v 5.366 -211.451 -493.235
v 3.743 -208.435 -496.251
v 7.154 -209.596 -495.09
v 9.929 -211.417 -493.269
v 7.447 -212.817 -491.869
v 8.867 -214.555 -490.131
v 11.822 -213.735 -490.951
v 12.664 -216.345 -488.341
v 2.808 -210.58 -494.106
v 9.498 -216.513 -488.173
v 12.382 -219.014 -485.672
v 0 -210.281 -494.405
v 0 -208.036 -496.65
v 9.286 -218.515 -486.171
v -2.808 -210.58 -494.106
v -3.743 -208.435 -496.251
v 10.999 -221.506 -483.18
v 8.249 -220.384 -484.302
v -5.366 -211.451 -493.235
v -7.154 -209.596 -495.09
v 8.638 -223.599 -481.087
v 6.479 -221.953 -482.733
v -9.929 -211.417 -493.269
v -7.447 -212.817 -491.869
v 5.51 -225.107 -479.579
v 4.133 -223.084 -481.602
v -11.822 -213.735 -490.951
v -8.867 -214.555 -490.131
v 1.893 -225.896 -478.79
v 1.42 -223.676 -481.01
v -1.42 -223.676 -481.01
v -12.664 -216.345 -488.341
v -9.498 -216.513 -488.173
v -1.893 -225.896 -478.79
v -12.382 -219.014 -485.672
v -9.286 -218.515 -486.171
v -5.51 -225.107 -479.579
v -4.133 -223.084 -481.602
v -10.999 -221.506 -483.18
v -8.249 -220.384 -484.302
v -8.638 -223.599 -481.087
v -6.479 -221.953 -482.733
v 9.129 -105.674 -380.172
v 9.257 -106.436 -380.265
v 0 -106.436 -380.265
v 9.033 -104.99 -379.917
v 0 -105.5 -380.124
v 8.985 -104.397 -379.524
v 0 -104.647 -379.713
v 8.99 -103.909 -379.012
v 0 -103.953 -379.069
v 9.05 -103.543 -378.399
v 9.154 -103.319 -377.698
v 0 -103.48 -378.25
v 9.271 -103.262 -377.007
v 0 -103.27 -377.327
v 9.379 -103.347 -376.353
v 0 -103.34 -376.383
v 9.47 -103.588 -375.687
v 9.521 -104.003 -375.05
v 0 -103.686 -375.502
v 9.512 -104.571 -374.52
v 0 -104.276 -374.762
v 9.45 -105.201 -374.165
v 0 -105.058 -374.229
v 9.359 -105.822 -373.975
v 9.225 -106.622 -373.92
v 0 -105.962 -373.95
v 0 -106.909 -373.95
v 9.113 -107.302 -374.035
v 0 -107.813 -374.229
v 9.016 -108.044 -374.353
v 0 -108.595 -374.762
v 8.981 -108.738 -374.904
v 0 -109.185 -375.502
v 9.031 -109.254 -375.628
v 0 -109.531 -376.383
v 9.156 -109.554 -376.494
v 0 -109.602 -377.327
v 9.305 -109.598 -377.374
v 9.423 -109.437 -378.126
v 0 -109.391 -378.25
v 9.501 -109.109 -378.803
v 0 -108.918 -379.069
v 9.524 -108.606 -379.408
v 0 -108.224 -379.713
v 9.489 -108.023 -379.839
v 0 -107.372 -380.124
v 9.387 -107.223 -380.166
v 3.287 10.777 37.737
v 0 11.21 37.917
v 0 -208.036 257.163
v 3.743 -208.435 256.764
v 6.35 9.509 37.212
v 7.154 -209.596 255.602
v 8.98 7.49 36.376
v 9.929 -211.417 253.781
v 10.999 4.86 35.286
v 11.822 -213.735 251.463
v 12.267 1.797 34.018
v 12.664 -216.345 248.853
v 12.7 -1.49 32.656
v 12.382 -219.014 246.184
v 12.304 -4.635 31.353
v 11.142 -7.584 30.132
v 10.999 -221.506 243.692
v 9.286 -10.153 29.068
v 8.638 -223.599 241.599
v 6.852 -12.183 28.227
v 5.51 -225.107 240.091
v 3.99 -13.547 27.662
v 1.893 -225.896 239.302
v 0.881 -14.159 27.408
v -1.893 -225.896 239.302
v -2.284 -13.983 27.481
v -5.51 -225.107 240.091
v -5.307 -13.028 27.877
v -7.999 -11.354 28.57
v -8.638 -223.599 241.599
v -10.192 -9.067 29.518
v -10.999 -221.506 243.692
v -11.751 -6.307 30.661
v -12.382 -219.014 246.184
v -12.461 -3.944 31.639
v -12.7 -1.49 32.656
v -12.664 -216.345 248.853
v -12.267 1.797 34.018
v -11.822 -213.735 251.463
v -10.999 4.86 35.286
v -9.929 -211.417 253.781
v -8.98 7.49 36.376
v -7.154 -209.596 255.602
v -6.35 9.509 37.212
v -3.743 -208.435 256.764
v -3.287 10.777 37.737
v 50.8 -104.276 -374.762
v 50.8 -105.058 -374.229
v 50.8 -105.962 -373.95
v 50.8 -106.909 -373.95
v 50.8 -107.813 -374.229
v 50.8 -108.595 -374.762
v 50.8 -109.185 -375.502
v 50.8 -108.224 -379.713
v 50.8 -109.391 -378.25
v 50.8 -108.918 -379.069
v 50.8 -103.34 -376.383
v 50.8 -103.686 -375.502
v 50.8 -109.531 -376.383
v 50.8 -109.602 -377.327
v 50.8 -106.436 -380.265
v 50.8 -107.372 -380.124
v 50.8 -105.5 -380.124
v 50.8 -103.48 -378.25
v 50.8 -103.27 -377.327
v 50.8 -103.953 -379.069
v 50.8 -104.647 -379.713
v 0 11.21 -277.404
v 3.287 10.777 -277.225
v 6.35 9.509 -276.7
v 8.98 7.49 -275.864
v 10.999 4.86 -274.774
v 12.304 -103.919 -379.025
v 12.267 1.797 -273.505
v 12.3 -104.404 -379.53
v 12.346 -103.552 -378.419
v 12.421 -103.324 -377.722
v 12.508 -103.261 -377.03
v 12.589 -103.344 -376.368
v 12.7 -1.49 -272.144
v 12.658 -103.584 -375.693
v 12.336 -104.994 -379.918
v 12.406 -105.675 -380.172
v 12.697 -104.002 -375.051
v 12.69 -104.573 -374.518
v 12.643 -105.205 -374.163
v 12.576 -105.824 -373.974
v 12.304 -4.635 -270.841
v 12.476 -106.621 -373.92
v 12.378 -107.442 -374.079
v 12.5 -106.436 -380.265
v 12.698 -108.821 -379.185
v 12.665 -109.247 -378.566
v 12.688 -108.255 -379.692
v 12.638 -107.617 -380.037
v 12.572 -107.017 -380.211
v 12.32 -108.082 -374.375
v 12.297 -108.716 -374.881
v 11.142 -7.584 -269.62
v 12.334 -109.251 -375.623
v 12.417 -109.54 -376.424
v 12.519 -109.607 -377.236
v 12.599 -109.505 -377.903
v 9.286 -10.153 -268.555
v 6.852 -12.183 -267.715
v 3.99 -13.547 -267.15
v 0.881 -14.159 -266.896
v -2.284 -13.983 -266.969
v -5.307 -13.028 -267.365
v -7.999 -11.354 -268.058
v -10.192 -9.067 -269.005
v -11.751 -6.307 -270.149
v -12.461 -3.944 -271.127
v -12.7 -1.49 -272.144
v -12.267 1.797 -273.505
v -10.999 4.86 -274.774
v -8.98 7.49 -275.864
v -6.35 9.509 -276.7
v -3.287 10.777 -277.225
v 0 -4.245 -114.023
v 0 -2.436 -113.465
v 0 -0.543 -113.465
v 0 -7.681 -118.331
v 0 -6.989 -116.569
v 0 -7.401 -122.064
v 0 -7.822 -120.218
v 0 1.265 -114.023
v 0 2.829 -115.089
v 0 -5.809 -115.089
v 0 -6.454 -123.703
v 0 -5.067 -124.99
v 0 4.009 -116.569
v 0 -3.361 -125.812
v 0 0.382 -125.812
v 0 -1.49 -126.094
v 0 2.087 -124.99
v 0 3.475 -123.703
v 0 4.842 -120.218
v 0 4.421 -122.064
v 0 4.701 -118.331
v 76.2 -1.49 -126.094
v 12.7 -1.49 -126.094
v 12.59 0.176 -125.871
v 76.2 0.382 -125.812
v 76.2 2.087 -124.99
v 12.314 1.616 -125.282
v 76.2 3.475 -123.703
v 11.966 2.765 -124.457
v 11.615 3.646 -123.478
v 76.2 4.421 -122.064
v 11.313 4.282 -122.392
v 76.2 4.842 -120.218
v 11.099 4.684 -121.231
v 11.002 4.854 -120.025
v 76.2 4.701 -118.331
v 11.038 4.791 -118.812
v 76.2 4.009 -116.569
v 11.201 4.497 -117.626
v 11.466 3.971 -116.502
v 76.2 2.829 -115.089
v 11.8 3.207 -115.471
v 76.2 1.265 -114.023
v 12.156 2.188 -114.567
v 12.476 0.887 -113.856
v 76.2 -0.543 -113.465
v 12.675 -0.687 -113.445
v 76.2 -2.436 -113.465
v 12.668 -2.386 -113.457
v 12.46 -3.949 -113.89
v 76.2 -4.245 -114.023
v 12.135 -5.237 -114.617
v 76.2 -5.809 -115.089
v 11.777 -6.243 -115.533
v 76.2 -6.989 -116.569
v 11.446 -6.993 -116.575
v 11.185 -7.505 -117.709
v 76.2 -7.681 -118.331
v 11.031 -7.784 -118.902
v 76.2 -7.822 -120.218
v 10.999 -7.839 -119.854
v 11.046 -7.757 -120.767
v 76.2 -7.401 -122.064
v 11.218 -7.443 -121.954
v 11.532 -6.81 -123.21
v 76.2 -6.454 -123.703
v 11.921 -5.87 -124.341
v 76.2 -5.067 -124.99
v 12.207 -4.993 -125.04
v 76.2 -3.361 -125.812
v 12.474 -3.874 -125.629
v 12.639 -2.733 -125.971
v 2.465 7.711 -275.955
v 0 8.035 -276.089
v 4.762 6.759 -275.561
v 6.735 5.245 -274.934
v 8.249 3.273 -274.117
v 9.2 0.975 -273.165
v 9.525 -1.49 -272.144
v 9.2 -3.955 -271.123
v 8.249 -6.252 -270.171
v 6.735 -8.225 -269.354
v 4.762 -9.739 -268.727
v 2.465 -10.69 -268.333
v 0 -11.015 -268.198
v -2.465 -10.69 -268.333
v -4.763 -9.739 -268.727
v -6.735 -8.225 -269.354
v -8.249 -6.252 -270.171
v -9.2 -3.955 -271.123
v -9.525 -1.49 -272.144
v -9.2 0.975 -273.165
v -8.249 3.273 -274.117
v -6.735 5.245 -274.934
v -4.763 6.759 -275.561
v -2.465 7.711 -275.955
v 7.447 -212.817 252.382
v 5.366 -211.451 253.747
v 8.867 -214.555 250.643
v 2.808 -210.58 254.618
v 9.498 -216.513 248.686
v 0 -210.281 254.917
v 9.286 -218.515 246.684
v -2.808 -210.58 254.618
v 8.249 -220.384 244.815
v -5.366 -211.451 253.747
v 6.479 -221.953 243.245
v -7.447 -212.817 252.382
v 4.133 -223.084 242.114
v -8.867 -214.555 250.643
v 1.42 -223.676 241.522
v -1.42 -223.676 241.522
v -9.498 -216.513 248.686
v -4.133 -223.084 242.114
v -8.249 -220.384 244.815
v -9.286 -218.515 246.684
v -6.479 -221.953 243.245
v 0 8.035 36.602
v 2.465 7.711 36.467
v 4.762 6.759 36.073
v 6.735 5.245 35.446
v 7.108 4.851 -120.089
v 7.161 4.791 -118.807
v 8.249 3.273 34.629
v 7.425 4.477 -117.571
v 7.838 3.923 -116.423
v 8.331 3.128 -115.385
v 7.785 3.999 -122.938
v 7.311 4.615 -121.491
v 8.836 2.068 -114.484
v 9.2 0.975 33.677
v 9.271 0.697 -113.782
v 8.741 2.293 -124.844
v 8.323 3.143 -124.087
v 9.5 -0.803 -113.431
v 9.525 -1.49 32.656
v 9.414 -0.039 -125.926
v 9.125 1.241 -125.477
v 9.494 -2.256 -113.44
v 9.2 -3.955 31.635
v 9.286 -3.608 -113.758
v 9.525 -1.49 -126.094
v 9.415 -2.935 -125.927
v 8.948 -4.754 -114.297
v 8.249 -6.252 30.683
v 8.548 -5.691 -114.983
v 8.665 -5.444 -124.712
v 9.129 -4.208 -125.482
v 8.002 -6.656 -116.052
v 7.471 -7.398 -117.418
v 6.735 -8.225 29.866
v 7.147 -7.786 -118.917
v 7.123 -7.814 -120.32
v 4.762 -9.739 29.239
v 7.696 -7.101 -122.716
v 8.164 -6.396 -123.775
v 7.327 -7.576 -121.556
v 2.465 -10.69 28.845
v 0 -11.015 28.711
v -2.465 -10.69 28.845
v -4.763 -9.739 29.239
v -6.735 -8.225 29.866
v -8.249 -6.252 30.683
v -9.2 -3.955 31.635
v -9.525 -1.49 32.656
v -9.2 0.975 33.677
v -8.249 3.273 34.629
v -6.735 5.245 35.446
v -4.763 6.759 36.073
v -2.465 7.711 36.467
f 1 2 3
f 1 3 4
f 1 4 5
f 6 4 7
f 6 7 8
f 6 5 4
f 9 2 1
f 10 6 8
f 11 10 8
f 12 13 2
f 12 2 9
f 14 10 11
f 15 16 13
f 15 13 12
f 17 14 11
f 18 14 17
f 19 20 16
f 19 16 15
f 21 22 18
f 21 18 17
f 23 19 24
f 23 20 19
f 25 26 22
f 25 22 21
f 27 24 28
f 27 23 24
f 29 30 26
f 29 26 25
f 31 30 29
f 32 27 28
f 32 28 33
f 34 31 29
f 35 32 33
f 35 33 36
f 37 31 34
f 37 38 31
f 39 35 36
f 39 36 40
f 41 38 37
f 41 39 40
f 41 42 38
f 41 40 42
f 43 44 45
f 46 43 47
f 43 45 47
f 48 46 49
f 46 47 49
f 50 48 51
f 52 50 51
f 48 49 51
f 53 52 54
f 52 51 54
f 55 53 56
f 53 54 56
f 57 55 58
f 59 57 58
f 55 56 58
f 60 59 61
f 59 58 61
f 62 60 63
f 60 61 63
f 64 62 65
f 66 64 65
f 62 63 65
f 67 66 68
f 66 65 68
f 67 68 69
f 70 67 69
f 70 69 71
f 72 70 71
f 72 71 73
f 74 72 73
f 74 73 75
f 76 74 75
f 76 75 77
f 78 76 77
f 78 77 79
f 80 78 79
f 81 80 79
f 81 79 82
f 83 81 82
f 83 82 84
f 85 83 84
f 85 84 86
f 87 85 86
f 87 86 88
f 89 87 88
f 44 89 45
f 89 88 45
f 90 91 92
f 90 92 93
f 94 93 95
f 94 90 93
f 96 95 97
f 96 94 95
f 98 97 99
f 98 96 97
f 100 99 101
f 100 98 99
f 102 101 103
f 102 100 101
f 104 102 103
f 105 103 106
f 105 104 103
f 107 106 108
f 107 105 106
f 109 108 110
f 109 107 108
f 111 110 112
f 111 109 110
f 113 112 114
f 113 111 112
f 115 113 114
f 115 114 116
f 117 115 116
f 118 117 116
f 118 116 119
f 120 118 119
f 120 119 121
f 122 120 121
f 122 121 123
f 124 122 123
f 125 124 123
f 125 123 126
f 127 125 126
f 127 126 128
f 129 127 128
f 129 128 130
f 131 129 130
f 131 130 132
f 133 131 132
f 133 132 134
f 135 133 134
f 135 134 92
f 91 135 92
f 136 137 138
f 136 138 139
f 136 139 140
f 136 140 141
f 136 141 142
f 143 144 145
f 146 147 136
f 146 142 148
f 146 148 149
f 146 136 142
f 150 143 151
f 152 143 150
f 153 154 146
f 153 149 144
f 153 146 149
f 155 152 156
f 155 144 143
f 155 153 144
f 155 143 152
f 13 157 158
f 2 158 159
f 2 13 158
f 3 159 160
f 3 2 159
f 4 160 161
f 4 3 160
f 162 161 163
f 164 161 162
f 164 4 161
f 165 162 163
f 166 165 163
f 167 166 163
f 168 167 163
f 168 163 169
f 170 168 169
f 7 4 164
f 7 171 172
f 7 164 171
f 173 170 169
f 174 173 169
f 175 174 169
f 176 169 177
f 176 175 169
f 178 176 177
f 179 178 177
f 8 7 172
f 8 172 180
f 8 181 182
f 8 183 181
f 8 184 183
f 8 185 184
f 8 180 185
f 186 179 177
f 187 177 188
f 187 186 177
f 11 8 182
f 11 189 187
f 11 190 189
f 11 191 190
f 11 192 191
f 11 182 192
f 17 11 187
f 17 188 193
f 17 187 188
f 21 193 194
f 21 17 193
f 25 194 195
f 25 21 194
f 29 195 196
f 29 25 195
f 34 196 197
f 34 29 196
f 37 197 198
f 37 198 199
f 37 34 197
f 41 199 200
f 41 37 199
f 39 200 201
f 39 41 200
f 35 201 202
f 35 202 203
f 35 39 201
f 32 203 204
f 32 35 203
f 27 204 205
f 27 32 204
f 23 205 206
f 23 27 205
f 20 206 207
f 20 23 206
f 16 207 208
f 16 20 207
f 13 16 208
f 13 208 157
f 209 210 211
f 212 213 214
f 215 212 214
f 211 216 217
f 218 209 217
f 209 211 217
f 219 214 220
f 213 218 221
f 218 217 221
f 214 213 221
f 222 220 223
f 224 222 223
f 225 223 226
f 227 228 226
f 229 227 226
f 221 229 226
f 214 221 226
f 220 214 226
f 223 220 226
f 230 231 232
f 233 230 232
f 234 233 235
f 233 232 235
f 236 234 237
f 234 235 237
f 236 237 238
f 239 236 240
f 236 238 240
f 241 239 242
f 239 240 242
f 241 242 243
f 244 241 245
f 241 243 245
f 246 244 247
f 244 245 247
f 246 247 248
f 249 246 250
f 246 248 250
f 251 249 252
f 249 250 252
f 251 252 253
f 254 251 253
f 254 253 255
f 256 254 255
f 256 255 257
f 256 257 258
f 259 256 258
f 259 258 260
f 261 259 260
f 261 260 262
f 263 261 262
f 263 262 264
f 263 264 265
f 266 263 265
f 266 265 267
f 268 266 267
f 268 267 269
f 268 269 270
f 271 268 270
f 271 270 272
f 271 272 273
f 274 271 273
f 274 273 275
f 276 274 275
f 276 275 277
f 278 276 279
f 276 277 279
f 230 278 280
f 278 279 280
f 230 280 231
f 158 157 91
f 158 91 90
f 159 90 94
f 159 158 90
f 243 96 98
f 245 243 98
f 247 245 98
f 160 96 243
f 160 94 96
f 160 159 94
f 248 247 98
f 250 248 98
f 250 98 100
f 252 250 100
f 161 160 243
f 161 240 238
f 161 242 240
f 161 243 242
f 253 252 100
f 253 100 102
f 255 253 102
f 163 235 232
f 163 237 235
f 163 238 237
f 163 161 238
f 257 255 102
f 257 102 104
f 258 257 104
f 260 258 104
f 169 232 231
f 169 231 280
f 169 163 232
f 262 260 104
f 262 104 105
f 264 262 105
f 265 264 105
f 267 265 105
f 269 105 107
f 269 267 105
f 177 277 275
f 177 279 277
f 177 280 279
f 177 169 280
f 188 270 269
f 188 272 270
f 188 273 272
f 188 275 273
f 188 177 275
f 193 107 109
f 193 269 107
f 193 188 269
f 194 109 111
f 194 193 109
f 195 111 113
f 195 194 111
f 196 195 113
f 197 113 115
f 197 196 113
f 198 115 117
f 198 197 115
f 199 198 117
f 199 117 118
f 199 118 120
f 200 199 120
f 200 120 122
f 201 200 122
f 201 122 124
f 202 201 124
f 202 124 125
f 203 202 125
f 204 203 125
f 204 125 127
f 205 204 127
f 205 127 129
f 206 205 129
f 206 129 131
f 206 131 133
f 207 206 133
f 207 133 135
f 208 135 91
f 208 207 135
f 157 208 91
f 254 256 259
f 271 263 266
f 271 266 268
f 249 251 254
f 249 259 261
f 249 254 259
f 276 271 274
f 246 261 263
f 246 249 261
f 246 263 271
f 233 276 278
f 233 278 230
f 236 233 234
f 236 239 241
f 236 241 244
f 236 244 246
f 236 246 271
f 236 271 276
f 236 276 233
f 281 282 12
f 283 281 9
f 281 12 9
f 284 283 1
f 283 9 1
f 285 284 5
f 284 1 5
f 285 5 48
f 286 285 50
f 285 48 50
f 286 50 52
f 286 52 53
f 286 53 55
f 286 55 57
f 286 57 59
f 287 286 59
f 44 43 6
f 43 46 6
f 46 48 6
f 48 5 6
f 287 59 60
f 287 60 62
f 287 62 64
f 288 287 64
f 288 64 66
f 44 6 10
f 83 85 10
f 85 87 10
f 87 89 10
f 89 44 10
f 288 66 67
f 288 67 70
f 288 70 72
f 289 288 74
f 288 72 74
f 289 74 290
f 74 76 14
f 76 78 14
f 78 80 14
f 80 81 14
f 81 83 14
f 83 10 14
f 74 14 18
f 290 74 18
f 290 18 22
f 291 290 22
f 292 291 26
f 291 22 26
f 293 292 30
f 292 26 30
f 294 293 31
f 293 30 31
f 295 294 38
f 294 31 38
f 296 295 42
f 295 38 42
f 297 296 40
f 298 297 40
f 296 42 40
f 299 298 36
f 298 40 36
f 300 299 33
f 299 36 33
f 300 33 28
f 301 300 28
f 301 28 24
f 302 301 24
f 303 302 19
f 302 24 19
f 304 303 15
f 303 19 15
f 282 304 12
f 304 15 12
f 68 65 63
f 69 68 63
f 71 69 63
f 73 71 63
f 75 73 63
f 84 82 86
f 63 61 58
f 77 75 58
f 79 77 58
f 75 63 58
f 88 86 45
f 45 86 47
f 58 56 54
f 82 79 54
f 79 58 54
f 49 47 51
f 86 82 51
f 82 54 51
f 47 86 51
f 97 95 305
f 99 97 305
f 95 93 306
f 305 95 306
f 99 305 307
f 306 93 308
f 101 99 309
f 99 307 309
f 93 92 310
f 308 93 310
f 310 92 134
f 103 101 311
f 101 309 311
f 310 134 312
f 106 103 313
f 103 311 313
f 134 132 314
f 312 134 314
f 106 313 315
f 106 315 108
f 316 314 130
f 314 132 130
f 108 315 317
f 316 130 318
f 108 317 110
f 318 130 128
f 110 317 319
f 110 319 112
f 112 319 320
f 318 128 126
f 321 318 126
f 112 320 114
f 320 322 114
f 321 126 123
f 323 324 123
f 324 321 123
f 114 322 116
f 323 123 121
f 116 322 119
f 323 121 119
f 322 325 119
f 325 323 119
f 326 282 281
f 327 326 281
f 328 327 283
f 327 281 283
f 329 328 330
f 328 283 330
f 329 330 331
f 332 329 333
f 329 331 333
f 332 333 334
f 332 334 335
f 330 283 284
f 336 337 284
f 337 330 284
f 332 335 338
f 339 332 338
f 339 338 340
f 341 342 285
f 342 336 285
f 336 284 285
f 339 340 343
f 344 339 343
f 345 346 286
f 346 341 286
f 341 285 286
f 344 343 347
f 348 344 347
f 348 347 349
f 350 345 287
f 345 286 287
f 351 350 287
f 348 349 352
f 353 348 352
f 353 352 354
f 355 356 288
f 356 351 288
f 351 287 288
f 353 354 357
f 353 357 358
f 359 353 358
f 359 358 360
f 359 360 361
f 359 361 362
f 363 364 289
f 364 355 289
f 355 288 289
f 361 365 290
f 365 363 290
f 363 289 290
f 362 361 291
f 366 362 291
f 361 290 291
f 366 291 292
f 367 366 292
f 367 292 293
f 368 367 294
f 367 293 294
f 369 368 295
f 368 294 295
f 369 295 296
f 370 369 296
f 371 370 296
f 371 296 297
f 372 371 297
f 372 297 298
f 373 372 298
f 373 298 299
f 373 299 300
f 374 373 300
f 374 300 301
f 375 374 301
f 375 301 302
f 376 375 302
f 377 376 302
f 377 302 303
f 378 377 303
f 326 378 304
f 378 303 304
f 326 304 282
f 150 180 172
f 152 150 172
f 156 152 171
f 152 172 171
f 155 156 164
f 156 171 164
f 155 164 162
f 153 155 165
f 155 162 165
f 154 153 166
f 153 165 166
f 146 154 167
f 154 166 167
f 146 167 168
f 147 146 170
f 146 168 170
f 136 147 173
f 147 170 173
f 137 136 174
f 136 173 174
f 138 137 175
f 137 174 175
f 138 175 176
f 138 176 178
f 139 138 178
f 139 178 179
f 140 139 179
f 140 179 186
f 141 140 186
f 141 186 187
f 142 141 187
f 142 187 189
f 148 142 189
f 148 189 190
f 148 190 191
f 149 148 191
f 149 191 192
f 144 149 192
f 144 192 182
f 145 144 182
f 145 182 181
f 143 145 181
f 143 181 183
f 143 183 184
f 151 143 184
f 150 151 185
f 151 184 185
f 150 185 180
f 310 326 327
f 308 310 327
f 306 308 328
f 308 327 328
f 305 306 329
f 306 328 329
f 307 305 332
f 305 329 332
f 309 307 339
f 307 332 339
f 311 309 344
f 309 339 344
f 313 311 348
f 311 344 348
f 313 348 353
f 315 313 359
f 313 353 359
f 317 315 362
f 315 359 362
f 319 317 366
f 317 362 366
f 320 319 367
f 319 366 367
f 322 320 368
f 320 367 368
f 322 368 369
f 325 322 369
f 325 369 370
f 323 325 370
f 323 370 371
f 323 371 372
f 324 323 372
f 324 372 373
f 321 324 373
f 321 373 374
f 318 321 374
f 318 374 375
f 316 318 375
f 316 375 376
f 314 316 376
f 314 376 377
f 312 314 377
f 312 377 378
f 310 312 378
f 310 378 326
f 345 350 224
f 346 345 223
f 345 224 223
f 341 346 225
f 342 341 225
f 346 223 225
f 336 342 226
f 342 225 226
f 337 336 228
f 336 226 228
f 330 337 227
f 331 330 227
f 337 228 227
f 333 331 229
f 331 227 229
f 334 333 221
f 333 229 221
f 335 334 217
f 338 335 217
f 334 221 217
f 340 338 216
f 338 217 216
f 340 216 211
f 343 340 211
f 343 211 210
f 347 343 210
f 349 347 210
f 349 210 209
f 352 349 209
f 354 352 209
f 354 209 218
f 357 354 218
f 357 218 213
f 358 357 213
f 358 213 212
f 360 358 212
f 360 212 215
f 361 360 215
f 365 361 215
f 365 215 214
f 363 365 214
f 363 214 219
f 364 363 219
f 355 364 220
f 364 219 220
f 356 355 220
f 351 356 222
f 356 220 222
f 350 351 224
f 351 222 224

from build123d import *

# Parameters (mm, degrees)
SWEEP1_PROFILE_R     = 12.7
CUT_SWEEP1_PROFILE_R = 9.525
SKETCH19_R           = 6.35
BOSS_EXTRUDE1_DEPTH  = 76.2
SKETCH28_R           = 3.175
BOSS_EXTRUDE2_DEPTH  = 50.8


with BuildPart() as part:
    # Sweep1: sweep along a path in Sketch2
    with BuildLine(Plane(origin=(0, 0, 0), x_dir=(0, 0, -1), z_dir=(1, 0, 0))) as sweep1_path:
        Line((-248.182278836, -217.015933946), (-32.65613193, -1.489787041))
        Line((-32.65613193, -1.489787041), (272.14386807, -1.489787041))
        Line((272.14386807, -1.489787041), (487.670014975, -217.015933946))
    # Sweep1 profile (on start of the path) → Sweep1 (sweep)
    with BuildSketch(Plane(origin=(0, -217.015933946, 248.182278836), x_dir=(0, 0.7071067811865461, 0.707106781186549), z_dir=(0, 0.707106781186549, -0.7071067811865461))):
        Circle(SWEEP1_PROFILE_R)
    sweep(path=sweep1_path.line, transition=Transition.RIGHT)

    # Cut-Sweep1: sweep along a path in Sketch2<2>
    with BuildLine(Plane(origin=(0, 0, 0), x_dir=(0, 0, -1), z_dir=(1, 0, 0))) as cut_sweep1_path:
        Line((-248.182278836, -217.015933946), (-32.65613193, -1.489787041))
        Line((-32.65613193, -1.489787041), (272.14386807, -1.489787041))
        Line((272.14386807, -1.489787041), (487.670014975, -217.015933946))
    # Cut-Sweep1 profile (on start of the path) → Cut-Sweep1 (sweep, cut)
    with BuildSketch(Plane(origin=(0, -217.015933946, 248.182278836), x_dir=(0, 0.7071067811865461, 0.707106781186549), z_dir=(0, 0.707106781186549, -0.7071067811865461))):
        Circle(CUT_SWEEP1_PROFILE_R)
    sweep(path=cut_sweep1_path.line, transition=Transition.RIGHT, mode=Mode.SUBTRACT)

    # Sketch19 → Boss-Extrude1 (add)
    with BuildSketch(Plane(origin=(0, 0, 0), x_dir=(0, 0, -1), z_dir=(1, 0, 0))):
        with Locations((119.74386807, -1.489787041)):
            Circle(SKETCH19_R)
    extrude(amount=BOSS_EXTRUDE1_DEPTH)

    # Sketch28 → Boss-Extrude2 (add)
    with BuildSketch(Plane(origin=(0, 0, 0), x_dir=(0, 0, -1), z_dir=(1, 0, 0))):
        with Locations((377.089758854, -106.435677825)):
            Circle(SKETCH28_R)
    extrude(amount=BOSS_EXTRUDE2_DEPTH)


solid = part.part
